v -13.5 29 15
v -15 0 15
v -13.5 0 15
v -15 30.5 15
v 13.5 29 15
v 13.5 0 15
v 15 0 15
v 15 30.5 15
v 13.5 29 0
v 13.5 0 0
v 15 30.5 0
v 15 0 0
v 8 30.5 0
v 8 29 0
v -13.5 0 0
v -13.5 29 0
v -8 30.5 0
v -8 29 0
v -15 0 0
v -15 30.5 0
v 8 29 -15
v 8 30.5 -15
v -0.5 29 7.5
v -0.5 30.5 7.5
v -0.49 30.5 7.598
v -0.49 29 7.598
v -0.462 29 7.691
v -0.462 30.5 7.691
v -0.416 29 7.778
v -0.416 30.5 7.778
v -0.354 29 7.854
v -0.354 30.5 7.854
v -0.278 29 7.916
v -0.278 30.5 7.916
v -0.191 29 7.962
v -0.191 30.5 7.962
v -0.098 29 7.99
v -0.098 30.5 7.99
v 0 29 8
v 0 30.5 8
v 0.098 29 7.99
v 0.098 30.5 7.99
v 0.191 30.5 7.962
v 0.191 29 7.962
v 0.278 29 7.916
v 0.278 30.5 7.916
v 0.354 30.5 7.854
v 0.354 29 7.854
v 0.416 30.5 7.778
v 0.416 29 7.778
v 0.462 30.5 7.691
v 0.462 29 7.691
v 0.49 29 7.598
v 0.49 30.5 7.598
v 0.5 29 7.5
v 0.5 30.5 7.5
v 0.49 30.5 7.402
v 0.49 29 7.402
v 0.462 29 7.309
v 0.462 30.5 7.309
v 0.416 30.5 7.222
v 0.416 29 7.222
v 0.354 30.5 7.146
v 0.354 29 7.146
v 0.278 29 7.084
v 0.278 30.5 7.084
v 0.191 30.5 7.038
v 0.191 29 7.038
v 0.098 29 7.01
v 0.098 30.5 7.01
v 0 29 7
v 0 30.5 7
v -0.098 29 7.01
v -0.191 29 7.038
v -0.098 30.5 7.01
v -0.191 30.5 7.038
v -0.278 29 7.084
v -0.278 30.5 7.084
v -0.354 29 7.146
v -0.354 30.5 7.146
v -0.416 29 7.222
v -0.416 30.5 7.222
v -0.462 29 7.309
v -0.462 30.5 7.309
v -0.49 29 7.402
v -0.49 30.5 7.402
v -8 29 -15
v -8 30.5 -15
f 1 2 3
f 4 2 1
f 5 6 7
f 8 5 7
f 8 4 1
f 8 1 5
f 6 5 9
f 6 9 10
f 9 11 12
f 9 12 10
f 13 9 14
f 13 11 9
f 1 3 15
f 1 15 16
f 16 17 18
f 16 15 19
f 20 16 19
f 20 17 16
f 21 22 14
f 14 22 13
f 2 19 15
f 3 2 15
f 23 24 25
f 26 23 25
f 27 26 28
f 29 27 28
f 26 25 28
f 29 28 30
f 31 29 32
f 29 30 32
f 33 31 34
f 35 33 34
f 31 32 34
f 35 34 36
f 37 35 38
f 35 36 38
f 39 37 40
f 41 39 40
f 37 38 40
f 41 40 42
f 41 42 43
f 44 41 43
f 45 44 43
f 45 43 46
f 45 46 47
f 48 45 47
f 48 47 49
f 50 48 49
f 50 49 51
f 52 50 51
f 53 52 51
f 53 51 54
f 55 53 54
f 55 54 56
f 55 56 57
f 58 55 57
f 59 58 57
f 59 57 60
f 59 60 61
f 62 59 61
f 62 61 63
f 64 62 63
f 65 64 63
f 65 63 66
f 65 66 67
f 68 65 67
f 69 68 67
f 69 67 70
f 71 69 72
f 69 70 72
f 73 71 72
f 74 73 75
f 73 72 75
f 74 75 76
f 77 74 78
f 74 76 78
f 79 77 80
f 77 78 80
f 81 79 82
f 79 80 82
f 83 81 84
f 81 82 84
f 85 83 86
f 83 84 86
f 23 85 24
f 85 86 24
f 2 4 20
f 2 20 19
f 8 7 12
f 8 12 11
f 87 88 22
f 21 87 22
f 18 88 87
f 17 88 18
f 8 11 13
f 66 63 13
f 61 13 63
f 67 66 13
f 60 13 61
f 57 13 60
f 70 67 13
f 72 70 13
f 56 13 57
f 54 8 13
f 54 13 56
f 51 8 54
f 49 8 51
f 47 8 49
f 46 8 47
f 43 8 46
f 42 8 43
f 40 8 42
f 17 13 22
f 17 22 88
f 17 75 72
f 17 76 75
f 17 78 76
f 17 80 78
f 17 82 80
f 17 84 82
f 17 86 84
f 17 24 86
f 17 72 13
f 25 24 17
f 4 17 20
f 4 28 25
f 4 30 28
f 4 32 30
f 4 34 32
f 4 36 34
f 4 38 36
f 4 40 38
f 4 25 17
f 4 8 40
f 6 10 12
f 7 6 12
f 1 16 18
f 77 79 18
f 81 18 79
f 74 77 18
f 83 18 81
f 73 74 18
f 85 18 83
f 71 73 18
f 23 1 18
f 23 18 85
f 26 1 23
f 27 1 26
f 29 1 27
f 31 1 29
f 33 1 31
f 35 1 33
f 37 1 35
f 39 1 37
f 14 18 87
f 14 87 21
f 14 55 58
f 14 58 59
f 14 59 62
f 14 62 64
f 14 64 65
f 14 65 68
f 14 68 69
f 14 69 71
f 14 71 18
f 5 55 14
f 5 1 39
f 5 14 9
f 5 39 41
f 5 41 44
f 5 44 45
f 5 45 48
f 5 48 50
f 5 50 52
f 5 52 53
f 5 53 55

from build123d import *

# Parameters (mm, degrees)
SKETCH001_R      = 0.5
SKETCH001_W      = 18
SKETCH001_H      = 16
EXTRUDE001_DEPTH = 32
EXTRUDE_DEPTH    = 15


with BuildPart() as extrude001:
    # Sketch001 → Extrude001 (new body)
    with BuildSketch(Plane(origin=(0, 31, 0), x_dir=(-1, 0, 0), z_dir=(0, 1, 0))):
        with Locations((0, 7.5)):
            Circle(SKETCH001_R)
        with Locations((-17, -8)):
            Rectangle(SKETCH001_W, SKETCH001_H)
        with Locations((17, -8)):
            Rectangle(SKETCH001_W, SKETCH001_H)
    extrude(amount=-EXTRUDE001_DEPTH)


with BuildPart() as cut:
    # Sketch → Extrude (new body, symmetric)
    with BuildSketch(Plane.XY):
        Polygon((-13.5, 0), (-13.5, 29), (13.5, 29), (13.5, 0), (15, 0), (15, 30.5), (-15, 30.5), (-15, 0), align=None)
    extrude(amount=EXTRUDE_DEPTH, both=True)

    # Cut: cut Extrude001
    add(extrude001.part, mode=Mode.SUBTRACT)


solid = cut.part
